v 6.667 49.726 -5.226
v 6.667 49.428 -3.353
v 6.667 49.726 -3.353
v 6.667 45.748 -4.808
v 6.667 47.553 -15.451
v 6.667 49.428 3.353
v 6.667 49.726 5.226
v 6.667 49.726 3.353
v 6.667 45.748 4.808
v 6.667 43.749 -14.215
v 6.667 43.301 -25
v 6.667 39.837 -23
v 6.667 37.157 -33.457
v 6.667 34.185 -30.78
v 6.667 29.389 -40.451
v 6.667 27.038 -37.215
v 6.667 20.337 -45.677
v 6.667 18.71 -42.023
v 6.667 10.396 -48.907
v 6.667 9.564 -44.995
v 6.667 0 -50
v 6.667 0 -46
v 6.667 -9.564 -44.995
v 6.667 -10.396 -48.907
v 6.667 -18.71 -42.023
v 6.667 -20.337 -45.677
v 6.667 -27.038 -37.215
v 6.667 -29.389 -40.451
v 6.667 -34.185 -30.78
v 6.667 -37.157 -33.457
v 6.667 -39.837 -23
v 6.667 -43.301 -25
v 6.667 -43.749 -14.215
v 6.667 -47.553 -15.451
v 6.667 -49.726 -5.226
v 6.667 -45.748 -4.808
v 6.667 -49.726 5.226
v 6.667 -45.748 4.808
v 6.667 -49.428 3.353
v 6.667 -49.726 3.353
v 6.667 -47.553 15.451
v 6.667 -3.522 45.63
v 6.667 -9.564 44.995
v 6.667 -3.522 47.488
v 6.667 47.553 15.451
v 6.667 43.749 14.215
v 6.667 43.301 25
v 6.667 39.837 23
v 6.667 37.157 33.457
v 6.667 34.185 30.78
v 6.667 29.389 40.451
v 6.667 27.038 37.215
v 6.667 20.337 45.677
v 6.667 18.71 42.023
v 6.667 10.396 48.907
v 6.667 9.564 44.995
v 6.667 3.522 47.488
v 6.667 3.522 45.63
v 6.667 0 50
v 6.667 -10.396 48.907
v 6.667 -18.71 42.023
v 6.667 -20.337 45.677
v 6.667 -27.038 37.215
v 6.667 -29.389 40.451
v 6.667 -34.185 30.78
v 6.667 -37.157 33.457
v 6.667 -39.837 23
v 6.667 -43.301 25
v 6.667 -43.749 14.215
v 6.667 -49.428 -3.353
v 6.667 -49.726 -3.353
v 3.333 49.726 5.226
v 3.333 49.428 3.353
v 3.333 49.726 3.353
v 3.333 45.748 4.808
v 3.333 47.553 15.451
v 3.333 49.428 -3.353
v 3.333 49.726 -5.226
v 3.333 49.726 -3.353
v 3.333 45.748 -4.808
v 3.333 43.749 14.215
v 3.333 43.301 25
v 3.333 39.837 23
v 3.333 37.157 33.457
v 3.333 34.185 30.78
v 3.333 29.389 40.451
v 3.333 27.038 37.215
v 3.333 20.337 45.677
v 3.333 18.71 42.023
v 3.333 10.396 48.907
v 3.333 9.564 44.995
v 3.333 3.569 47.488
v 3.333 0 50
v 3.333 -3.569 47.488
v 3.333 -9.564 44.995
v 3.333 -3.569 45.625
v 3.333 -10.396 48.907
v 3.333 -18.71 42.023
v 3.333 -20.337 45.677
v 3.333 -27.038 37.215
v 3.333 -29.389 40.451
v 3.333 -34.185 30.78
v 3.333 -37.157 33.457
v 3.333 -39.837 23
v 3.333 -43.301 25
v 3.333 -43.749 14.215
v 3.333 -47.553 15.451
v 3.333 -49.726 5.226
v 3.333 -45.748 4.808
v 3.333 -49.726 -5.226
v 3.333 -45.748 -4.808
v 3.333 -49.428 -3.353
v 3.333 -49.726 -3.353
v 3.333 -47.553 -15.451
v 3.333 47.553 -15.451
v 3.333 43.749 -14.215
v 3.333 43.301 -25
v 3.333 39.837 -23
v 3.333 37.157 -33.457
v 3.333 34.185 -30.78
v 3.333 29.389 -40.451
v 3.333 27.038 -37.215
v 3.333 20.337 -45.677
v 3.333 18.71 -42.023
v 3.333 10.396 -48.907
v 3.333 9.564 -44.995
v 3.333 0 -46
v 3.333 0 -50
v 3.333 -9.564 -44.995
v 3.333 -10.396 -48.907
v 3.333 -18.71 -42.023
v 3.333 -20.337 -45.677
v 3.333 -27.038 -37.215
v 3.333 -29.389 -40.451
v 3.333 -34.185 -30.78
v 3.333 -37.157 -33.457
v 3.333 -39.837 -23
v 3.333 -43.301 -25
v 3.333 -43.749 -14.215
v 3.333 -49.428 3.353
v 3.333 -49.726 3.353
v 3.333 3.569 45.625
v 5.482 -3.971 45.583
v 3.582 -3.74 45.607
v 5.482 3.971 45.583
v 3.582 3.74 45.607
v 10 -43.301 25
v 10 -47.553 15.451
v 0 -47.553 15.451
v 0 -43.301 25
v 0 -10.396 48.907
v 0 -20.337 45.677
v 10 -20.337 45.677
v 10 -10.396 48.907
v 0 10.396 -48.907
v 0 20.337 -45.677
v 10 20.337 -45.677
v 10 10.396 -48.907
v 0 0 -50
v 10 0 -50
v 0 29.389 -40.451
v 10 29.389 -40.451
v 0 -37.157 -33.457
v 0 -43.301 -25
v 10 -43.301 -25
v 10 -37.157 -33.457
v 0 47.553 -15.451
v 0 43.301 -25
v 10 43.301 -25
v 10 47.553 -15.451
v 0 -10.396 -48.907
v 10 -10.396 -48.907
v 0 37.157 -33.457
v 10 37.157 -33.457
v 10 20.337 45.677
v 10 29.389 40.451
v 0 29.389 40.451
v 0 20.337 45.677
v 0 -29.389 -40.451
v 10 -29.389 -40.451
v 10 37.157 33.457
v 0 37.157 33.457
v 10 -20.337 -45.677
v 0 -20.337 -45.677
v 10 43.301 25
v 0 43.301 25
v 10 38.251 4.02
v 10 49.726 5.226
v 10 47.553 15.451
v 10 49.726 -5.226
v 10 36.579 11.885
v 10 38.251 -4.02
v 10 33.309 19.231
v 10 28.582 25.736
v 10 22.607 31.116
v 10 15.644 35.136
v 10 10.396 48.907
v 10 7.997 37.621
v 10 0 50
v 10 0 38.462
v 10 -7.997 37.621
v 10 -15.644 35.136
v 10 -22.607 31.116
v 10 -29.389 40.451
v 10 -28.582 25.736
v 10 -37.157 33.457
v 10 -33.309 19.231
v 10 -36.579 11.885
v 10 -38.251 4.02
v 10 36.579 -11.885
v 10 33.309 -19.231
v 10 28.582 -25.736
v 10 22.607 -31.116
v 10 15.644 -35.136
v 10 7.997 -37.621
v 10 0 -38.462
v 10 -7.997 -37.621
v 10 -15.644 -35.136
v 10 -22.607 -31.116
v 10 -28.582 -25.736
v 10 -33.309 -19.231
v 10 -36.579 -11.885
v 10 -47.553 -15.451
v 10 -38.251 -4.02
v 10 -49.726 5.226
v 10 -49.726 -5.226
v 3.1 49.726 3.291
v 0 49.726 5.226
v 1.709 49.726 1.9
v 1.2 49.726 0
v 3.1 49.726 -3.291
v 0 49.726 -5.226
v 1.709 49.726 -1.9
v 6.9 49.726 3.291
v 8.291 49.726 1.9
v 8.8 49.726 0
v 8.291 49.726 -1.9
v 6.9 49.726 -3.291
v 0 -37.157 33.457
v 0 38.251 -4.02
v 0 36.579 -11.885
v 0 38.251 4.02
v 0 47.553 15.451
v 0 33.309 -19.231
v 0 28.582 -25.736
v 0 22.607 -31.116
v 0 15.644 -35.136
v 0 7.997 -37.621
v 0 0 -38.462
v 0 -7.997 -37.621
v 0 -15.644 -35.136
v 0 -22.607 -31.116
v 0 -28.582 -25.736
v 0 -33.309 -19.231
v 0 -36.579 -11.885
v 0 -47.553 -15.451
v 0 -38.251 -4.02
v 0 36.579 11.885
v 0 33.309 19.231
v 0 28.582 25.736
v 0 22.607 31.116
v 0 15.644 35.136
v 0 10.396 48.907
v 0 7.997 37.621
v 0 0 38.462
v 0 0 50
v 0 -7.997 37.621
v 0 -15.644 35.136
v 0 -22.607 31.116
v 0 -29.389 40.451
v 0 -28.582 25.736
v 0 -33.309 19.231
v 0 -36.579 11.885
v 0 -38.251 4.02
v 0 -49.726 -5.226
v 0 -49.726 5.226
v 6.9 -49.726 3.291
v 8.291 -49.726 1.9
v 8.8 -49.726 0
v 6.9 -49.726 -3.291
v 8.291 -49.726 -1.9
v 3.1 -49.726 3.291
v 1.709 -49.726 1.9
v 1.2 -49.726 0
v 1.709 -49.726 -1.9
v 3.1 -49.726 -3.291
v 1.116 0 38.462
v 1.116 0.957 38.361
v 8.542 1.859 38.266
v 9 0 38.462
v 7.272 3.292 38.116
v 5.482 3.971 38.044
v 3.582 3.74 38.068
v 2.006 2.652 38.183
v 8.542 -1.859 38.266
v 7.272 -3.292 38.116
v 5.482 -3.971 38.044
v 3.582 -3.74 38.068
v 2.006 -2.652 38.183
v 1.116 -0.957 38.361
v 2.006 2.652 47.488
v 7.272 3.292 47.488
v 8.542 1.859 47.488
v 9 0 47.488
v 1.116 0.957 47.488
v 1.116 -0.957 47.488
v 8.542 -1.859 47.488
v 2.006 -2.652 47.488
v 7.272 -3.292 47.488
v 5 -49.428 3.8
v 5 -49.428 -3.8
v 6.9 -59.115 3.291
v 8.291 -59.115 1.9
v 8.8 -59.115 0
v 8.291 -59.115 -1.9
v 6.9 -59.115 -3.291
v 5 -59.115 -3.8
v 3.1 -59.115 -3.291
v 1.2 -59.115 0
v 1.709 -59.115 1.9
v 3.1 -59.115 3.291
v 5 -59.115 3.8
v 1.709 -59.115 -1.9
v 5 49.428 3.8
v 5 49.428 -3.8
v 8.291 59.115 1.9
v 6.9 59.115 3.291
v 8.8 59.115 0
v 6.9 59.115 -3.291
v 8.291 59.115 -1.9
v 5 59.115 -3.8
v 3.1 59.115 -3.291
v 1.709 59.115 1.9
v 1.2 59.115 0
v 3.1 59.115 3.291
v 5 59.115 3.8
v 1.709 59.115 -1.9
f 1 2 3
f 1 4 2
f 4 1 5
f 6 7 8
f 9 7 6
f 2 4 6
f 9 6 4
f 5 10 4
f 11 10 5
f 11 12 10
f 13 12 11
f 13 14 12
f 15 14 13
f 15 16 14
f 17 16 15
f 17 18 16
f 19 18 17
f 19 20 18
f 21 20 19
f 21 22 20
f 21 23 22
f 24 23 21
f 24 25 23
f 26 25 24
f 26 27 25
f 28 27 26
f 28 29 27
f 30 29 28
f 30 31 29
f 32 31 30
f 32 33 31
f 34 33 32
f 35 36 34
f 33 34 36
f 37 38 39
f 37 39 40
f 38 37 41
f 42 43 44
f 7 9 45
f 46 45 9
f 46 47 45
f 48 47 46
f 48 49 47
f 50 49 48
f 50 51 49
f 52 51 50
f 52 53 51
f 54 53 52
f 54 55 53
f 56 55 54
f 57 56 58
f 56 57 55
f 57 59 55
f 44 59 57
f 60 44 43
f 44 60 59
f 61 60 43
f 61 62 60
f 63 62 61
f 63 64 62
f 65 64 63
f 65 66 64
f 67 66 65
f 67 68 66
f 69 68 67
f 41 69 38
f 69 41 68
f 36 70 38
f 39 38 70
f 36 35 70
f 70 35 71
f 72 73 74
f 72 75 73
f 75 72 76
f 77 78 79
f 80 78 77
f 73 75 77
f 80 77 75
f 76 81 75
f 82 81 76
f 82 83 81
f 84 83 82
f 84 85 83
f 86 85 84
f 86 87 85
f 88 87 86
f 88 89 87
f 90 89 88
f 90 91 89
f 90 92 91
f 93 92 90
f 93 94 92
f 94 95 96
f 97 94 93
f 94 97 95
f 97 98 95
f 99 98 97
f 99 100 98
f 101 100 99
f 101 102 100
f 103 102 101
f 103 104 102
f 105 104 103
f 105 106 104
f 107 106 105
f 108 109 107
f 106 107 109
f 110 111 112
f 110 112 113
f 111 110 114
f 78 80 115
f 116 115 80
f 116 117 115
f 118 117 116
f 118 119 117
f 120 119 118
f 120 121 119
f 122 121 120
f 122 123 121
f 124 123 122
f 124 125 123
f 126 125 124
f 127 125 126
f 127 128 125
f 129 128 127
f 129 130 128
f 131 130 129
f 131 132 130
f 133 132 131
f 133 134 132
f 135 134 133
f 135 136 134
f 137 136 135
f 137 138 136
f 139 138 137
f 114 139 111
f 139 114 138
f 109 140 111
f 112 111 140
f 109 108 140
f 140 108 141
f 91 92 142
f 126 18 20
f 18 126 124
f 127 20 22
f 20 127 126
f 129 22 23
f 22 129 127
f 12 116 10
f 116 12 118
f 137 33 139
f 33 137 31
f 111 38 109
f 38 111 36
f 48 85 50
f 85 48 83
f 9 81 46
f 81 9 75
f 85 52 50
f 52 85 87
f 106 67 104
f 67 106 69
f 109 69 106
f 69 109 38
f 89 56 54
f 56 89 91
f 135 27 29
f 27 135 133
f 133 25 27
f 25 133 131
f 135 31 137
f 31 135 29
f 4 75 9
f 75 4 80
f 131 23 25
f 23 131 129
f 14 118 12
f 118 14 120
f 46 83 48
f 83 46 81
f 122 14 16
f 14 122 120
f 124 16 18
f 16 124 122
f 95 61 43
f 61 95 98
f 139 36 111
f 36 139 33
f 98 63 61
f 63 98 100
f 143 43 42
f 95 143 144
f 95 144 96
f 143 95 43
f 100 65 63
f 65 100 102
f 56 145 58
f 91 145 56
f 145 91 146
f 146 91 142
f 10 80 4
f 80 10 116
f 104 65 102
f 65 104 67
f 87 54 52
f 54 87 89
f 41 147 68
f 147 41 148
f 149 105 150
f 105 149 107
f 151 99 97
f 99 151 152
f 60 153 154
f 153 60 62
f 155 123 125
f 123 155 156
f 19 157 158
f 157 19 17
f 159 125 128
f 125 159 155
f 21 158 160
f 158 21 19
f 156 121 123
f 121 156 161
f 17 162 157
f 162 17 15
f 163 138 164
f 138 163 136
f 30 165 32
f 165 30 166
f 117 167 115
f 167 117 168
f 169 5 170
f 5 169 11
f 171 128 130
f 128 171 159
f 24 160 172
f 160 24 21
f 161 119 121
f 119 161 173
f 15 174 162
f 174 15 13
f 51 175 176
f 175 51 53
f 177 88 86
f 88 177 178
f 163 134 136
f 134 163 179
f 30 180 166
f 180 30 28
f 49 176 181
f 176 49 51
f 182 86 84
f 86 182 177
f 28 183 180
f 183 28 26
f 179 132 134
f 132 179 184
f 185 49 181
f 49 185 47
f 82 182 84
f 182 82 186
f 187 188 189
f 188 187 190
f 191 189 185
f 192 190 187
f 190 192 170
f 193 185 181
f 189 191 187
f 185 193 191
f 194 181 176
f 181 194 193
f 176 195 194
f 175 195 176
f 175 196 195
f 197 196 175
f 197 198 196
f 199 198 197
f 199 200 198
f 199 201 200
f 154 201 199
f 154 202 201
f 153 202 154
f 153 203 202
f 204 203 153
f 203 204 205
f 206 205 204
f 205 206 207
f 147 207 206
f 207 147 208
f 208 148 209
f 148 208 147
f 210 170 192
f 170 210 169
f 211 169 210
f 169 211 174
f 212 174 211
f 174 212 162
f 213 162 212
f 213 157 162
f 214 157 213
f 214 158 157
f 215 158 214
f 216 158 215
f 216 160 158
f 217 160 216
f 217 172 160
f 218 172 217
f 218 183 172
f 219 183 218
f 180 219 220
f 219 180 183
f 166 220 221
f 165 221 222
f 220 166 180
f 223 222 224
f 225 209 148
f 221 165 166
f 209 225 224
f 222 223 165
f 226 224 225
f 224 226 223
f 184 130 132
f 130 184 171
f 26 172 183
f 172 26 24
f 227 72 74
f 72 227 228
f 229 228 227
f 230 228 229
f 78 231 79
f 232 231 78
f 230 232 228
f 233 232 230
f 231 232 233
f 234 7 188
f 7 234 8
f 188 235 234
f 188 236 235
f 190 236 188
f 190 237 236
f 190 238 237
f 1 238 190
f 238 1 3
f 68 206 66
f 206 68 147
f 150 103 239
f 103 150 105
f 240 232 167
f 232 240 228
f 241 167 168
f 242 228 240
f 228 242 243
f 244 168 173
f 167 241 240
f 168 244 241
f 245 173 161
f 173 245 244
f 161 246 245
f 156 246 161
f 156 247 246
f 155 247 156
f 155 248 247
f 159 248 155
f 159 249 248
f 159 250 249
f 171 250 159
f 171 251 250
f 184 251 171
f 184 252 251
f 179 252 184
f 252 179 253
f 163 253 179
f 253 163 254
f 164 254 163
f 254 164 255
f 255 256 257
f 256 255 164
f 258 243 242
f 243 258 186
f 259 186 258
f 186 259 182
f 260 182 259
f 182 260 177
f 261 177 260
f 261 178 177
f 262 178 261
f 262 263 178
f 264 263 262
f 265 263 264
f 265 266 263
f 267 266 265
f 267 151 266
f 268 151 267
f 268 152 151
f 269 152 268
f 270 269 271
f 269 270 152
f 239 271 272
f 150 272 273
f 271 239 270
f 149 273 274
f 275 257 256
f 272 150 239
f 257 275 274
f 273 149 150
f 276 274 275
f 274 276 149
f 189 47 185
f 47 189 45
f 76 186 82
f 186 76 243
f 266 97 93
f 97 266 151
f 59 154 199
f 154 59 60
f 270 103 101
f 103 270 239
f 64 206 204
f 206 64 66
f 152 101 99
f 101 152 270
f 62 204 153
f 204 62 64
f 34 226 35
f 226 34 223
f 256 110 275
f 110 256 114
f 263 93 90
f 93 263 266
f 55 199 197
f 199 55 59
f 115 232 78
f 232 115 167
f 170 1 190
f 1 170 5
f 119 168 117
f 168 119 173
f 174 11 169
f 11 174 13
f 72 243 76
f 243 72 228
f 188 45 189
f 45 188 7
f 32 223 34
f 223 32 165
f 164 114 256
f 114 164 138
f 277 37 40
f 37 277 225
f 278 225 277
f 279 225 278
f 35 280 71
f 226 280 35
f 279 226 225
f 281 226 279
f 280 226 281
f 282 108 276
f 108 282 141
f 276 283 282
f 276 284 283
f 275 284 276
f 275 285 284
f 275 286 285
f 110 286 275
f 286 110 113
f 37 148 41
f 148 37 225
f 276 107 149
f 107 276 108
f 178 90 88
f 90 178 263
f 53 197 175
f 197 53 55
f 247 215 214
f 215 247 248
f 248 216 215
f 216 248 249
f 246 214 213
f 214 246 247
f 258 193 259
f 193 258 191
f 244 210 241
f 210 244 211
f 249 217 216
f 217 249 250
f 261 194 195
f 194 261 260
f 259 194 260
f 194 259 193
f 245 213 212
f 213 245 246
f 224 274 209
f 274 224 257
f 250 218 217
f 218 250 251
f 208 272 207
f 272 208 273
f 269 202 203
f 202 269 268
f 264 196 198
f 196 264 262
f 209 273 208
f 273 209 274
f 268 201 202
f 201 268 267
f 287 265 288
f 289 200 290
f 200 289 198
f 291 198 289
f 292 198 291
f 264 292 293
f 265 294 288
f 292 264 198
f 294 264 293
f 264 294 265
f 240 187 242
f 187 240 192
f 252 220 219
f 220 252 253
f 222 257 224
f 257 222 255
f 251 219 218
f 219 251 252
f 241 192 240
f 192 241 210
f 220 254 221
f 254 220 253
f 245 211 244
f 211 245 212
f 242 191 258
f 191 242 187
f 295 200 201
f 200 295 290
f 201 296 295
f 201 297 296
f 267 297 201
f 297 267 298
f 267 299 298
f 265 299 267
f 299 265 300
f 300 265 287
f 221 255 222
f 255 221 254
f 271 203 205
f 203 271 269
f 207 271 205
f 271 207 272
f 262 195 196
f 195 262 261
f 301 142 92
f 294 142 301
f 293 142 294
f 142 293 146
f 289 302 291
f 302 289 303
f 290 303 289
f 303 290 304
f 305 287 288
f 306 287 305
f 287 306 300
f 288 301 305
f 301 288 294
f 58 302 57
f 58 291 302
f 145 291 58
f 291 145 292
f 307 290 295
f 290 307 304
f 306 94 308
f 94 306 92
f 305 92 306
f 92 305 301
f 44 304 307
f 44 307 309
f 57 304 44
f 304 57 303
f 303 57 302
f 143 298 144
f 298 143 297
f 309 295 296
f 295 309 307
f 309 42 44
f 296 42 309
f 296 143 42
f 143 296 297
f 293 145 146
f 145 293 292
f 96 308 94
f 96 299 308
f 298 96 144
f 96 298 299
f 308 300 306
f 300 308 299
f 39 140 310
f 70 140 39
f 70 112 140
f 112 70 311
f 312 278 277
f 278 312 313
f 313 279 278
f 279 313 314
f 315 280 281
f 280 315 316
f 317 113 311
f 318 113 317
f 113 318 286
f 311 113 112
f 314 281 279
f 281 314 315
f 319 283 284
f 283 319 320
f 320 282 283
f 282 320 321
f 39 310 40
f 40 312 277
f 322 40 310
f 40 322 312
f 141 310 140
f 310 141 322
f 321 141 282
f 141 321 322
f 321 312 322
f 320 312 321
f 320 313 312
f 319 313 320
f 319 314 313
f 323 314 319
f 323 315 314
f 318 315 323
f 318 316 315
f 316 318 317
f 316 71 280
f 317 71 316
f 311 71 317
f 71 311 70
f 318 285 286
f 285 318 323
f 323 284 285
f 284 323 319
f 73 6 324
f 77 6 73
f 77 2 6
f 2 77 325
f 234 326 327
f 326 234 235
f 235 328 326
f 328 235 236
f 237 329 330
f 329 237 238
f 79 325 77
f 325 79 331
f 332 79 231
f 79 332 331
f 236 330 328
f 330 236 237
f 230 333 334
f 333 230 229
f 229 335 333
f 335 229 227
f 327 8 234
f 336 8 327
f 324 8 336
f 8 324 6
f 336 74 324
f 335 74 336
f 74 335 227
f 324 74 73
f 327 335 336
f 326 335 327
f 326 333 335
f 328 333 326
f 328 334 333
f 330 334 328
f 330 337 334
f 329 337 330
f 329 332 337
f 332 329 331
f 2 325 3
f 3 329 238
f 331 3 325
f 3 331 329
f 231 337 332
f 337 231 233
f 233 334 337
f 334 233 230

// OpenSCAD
//Constants
MAX_RING_RADIUS = 50;//mm
DEFAULT_RING_THICKNESS = 10;//mm
MAIN_DRIVE_RADIUS = 13.76;//mm
RING_DRIVE_RADIUS = 6;//mm
BASE_HEIGHT = 60;//mm
BASE_WIDTH = 80;//mm
BEARING_INNER_RADIUS = 4;//mm
BEARING_TOTAL_RADIUS = 11;//mm
BEARING_THICKNESS = 7;//mm
GROOVE_DEPTH = 4;//mm
MOTOR_RADIUS_TOLERANCE = .2;

ring(MAX_RING_RADIUS,DEFAULT_RING_THICKNESS);

module ring(radius,thickness,mountPosition="NS"){
	union(){
		difference(){
			rotate([0,90,0]){
				difference(){
					cylinder(r=radius,h=thickness);
					//build punch out cylinder
					innerRadius = radius/1.3;
					innerThickness = thickness+4;
					translate([0,0,-(innerThickness/5)]){
						cylinder(r=innerRadius,h=innerThickness);
					}
					wireGroove(radius, GROOVE_DEPTH, thickness);
				}//ring diference end

				
			}//rotate end
			motorCutout(ringRadius = MAX_RING_RADIUS);
		}//main difference end

		difference(){
			bearingMount(BEARING_INNER_RADIUS,BEARING_THICKNESS);
			rotate([0,90,0]){
				wireGroove(MAX_RING_RADIUS-.4, GROOVE_DEPTH, DEFAULT_RING_THICKNESS);
			}
		}

		mirror([0,1,0]){
			difference(){
				bearingMount(BEARING_INNER_RADIUS,BEARING_THICKNESS);
				rotate([0,90,0]){
					wireGroove(MAX_RING_RADIUS-.4, GROOVE_DEPTH, DEFAULT_RING_THICKNESS);
				}
		}
		}

	}
}//module end

module motorCutout(motorRadius = 4, motorHeight = 17, ringRadius){
	//build stand-in motor
	translate([DEFAULT_RING_THICKNESS/2,0,ringRadius/1.64]){
		cylinder(r=motorRadius, h=motorHeight);
	}
	
}

module bearingMount(bearingInnerRadius, bearingThickness){
	
	bearingExtension = 7.5;
	bearingPegReduction = .2;
	translate([DEFAULT_RING_THICKNESS/2,(-MAX_RING_RADIUS+(bearingThickness/1.3)),0]){
		rotate([90,0,0]){
			cylinder(r=bearingInnerRadius-bearingPegReduction,h=bearingThickness+bearingExtension);
		}
	}
}

module wireGroove(ringRadius, depth, thickness){
	translate([0,0,thickness/3]){
		difference(){
			cylinder(r=ringRadius+.1,h=thickness/3);
			translate([0,0,-.1]){
				cylinder(r=ringRadius-depth,h=(thickness/3)+.3);
			}
		}
	}
}
